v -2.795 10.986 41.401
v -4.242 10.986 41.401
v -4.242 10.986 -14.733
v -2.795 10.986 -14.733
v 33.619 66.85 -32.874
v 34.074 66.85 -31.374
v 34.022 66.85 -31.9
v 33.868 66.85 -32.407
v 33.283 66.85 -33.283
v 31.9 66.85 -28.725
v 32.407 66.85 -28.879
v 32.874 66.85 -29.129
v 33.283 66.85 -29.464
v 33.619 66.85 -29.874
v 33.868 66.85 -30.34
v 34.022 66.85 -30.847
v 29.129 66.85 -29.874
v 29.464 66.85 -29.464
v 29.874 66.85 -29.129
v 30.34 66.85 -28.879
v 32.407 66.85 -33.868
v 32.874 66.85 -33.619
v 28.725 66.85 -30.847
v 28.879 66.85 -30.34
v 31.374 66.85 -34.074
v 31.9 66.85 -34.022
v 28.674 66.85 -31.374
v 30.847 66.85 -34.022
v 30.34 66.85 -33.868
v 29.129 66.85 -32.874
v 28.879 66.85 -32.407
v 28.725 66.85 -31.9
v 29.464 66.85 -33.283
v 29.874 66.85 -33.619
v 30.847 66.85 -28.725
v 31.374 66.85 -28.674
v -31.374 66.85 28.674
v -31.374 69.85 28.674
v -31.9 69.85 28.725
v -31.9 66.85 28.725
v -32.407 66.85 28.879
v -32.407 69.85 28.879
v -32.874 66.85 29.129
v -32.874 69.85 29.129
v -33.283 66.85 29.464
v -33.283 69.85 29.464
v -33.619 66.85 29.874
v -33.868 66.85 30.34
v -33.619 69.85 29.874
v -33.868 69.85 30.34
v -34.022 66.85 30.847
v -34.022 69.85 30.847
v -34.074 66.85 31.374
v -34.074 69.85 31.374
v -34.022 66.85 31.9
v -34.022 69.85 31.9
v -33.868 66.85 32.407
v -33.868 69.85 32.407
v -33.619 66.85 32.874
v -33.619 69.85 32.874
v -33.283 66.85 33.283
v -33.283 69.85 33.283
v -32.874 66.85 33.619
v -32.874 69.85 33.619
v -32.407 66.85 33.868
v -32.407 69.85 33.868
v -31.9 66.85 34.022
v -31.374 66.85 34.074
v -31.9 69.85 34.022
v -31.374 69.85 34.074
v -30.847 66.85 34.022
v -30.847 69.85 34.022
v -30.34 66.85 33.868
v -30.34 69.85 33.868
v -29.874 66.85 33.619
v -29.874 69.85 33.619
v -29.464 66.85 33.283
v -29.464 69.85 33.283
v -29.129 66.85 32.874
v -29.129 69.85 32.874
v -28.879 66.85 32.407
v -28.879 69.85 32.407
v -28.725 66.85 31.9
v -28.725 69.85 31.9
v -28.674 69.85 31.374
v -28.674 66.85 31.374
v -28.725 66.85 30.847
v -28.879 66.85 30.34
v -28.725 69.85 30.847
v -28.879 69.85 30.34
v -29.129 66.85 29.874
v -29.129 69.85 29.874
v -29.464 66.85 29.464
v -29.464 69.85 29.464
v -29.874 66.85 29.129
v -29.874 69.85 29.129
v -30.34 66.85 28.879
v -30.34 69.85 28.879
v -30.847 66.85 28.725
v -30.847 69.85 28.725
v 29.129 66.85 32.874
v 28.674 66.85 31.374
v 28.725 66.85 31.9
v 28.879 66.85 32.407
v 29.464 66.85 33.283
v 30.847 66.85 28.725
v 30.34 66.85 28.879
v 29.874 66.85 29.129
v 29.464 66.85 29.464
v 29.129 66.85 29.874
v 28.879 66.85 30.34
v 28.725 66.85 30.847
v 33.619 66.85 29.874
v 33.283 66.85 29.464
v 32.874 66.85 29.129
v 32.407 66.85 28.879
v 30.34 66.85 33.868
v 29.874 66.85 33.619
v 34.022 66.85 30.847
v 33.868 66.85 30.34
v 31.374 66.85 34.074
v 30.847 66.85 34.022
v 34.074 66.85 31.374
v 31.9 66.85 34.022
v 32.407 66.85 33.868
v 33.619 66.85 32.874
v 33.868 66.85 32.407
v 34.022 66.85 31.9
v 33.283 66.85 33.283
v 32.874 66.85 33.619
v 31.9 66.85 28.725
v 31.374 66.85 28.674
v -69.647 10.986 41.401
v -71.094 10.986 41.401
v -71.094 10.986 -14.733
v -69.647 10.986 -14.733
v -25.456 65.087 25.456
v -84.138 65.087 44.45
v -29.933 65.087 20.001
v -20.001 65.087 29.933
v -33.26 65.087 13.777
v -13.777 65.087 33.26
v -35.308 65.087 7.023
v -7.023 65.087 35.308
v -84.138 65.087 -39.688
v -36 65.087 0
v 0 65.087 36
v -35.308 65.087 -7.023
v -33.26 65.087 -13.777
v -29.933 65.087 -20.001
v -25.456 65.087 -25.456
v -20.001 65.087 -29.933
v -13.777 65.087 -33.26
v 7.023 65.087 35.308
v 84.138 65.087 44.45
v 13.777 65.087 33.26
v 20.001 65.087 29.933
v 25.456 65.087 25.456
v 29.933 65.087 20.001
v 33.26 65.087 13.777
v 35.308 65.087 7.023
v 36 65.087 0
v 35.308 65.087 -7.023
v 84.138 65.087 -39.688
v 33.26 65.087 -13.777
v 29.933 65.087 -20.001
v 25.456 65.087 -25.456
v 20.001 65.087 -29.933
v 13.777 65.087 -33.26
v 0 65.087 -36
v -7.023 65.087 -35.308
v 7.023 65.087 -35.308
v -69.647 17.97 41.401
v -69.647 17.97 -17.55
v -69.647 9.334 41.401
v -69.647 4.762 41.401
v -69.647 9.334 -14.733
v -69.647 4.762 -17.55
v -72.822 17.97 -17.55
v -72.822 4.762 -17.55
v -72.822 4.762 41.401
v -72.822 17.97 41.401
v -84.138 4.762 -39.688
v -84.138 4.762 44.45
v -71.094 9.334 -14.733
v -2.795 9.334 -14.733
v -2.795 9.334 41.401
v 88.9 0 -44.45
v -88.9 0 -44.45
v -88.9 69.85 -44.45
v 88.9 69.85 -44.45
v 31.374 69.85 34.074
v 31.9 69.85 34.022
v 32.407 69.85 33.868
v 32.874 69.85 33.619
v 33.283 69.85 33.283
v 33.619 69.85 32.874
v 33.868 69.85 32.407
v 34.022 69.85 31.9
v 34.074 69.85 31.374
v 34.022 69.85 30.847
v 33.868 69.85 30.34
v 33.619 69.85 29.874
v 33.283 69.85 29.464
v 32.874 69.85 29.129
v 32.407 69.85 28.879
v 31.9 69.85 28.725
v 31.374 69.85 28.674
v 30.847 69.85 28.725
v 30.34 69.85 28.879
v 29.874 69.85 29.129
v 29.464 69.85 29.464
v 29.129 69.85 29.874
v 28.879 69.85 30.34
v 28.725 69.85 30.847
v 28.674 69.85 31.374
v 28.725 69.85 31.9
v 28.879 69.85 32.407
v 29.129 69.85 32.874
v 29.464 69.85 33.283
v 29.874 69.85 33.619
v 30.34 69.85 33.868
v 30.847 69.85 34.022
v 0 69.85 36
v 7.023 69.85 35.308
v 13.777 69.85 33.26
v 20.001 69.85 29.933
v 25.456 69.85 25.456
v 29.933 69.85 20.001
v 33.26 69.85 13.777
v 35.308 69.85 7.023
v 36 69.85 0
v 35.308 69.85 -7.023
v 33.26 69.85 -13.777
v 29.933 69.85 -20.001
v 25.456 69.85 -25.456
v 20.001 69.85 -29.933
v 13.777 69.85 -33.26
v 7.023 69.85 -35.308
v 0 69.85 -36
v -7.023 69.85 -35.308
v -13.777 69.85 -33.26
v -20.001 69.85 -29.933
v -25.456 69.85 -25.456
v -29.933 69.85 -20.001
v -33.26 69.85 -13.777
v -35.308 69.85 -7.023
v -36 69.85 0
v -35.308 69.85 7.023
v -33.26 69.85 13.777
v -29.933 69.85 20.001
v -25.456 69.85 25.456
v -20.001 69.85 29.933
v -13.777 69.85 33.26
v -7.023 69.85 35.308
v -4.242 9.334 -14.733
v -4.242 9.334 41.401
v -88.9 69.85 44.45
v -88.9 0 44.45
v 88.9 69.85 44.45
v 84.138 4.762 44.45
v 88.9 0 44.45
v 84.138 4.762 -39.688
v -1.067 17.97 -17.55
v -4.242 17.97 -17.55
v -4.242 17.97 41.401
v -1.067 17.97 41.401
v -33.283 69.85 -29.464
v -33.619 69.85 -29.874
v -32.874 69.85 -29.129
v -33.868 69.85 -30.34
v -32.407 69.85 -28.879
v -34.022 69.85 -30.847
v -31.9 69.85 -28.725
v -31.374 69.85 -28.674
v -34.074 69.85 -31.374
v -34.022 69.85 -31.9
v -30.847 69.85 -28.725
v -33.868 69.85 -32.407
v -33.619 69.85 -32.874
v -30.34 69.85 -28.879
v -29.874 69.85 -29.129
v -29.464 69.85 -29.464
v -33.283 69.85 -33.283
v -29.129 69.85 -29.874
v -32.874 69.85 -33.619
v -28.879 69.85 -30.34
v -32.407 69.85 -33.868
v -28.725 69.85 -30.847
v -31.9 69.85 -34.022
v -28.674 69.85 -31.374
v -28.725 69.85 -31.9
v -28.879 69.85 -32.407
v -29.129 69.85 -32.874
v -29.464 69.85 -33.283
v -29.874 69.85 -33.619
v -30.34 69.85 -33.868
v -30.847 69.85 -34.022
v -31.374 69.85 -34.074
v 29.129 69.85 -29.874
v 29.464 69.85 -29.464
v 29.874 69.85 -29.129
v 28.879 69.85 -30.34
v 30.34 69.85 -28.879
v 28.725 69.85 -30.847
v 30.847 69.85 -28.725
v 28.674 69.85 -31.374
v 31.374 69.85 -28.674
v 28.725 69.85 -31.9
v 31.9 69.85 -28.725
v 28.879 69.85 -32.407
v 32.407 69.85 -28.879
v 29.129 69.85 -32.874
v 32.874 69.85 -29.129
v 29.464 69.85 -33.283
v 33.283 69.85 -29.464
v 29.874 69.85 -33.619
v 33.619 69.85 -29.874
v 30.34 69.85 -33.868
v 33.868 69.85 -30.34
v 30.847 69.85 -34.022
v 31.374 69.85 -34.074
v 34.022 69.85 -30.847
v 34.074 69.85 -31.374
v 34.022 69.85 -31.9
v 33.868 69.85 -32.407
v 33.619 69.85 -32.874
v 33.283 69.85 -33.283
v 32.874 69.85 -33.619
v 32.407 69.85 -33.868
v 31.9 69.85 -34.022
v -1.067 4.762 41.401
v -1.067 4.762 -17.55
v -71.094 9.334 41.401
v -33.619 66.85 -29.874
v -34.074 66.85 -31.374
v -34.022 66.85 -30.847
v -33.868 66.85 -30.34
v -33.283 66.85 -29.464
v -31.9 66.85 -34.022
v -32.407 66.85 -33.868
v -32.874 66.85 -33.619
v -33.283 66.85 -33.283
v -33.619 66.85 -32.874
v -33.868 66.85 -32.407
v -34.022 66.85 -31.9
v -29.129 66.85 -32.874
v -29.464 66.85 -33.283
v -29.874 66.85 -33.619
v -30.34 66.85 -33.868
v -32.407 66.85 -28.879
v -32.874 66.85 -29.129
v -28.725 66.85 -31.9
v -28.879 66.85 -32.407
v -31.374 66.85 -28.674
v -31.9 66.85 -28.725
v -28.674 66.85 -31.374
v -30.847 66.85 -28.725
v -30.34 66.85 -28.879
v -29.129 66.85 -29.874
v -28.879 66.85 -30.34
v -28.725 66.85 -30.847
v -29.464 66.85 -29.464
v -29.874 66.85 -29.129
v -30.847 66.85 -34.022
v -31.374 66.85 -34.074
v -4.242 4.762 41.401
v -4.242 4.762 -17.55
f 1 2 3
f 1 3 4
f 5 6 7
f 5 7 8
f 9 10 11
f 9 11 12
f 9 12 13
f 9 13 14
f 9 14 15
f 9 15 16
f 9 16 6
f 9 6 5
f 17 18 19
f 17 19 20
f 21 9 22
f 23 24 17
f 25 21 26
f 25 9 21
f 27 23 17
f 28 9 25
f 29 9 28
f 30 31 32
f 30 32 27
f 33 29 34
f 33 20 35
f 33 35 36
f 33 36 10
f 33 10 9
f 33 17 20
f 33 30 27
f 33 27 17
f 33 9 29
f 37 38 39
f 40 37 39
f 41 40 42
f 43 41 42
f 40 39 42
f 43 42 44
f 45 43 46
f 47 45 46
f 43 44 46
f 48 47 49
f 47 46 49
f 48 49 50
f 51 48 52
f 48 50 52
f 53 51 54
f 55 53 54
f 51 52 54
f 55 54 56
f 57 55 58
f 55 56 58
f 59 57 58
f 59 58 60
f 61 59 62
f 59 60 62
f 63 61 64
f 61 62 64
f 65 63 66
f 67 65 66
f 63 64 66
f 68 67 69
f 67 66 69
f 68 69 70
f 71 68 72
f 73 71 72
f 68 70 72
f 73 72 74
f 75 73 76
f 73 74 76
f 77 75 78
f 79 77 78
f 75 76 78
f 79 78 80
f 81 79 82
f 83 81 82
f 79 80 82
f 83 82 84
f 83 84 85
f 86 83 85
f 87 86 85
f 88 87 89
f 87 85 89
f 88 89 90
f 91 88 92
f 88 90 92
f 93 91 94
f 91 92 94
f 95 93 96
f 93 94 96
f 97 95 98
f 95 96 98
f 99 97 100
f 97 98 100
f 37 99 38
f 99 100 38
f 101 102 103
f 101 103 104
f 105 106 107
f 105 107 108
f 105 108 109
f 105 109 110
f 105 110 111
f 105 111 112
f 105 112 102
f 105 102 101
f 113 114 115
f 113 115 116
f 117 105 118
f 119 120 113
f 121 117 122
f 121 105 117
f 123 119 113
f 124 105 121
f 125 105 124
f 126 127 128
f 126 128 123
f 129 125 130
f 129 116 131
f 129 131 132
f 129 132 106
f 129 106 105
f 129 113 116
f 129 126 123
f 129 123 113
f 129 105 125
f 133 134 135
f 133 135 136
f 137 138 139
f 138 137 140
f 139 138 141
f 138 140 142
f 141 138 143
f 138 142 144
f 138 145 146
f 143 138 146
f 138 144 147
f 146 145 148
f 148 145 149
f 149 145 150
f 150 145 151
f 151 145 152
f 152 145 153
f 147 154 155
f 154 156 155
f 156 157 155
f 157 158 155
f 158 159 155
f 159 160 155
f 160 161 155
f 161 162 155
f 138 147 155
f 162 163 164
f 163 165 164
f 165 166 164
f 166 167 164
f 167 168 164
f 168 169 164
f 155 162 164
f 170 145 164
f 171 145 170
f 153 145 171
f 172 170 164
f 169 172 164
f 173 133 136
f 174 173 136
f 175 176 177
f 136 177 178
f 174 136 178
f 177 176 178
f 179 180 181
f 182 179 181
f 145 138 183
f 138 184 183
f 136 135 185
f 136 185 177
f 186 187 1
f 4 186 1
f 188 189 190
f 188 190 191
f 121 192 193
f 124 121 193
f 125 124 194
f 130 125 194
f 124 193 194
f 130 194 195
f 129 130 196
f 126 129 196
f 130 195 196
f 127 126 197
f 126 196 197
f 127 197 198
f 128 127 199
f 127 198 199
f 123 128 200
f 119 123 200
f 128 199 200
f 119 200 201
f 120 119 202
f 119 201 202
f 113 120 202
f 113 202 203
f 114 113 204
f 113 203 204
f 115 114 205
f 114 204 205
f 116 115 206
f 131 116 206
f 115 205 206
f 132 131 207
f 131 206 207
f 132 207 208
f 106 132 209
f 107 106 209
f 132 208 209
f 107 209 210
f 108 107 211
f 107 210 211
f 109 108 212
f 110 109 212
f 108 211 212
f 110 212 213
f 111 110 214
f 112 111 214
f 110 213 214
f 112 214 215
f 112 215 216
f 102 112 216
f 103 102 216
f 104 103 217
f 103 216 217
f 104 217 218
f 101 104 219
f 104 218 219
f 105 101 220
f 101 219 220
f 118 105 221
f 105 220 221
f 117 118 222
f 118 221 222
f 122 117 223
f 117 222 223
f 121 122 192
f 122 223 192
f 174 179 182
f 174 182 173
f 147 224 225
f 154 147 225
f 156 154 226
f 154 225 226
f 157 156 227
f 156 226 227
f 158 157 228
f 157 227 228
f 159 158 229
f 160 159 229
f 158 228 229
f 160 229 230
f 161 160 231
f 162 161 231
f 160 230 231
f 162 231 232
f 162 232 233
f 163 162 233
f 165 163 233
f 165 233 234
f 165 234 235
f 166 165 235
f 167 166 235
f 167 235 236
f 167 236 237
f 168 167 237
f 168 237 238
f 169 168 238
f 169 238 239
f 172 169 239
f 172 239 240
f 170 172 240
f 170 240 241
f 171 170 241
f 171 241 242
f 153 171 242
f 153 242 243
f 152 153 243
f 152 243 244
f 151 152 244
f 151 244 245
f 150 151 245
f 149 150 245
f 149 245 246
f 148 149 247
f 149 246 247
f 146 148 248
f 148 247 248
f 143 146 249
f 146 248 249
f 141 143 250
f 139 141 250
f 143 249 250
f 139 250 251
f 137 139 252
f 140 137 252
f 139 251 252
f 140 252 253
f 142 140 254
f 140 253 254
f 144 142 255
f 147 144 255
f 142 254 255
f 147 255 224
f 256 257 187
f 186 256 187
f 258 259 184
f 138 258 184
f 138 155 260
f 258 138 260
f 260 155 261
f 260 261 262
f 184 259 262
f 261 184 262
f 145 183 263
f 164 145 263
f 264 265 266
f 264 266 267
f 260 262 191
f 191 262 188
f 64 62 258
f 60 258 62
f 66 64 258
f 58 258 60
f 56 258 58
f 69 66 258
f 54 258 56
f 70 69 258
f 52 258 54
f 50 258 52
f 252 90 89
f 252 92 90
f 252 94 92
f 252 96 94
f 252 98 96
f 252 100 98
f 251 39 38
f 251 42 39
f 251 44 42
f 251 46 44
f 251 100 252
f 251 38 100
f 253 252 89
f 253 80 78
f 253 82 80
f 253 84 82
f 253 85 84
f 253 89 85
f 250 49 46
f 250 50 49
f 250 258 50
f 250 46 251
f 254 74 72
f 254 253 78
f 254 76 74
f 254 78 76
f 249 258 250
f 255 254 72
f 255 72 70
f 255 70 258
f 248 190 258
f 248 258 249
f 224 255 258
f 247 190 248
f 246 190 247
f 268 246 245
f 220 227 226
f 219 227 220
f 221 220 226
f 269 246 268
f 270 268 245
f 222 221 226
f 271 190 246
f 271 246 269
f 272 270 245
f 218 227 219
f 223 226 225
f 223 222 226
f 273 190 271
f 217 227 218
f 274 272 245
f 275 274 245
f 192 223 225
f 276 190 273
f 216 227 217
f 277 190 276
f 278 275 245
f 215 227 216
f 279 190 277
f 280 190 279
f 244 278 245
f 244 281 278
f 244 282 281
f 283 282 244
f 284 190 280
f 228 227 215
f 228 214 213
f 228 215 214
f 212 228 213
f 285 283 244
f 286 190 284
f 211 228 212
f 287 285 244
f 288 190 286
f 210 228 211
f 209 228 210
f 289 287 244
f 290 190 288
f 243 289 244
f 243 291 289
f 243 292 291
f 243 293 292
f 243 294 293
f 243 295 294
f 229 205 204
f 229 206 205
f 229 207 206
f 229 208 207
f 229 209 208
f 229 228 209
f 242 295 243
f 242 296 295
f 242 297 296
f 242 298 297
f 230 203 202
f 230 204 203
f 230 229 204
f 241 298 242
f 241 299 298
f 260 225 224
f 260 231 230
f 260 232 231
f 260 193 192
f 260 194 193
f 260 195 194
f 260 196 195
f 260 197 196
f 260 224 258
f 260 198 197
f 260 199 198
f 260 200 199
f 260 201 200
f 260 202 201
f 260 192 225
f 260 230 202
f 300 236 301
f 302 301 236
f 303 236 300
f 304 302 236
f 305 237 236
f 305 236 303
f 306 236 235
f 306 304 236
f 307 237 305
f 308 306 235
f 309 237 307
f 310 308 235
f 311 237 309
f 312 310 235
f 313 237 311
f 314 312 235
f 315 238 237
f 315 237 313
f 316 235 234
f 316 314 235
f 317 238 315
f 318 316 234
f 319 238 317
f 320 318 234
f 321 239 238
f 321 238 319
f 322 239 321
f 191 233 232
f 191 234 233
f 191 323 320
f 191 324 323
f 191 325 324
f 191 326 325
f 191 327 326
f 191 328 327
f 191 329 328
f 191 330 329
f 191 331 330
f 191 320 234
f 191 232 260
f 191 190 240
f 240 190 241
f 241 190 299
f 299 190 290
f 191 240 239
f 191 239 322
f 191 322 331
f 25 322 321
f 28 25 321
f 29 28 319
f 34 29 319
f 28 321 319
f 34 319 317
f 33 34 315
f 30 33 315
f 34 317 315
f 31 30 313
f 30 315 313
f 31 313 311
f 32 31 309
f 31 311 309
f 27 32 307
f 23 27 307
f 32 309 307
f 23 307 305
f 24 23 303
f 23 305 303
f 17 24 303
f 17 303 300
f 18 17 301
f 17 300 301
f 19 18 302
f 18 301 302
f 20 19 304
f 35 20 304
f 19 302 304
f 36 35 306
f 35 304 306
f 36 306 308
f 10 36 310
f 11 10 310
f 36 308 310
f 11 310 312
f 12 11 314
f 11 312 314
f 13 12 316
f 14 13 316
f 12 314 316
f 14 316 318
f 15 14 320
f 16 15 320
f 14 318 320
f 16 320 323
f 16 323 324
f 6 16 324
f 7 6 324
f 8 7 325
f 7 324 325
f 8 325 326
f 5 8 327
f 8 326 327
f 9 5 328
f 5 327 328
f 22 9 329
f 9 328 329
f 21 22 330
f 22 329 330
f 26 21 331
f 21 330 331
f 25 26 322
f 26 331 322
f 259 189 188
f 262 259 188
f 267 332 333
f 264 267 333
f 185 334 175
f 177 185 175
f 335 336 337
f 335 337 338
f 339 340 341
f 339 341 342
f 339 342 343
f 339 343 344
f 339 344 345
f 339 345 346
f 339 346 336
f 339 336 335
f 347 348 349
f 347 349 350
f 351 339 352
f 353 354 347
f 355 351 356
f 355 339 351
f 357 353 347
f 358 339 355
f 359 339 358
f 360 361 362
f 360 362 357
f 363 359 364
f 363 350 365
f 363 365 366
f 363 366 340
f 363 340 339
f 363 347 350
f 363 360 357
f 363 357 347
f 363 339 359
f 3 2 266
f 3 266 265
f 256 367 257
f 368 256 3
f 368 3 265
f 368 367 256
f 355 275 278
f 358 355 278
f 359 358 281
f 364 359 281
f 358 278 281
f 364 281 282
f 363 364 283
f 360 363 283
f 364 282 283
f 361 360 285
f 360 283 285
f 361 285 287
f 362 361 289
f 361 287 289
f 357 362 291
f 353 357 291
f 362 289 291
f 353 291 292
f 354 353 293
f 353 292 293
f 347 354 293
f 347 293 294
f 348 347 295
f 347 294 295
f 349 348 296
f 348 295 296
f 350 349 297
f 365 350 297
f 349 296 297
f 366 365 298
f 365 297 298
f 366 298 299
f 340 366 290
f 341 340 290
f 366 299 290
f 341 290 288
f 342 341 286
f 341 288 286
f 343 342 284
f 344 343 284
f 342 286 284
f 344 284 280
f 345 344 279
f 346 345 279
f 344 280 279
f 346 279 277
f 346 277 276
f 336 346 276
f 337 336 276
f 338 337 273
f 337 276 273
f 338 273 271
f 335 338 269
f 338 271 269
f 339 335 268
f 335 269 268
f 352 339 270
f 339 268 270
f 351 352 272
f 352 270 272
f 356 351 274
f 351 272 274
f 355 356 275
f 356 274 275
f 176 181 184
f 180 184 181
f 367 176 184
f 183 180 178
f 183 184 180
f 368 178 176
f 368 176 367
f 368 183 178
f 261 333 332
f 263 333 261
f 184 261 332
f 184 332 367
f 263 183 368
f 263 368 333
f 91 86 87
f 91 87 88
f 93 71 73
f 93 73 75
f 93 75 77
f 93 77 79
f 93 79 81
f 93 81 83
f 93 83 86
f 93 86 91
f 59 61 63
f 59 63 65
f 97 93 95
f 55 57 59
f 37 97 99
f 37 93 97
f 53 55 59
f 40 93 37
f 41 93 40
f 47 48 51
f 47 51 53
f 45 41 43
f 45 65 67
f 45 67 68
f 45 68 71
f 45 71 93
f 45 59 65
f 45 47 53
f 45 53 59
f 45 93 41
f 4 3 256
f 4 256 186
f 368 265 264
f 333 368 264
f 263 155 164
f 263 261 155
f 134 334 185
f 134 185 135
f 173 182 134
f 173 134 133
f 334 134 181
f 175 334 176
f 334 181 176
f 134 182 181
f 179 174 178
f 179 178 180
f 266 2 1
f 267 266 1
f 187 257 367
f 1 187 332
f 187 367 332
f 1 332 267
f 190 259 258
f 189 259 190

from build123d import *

# Parameters (mm, degrees)
SKETCH1_W           = 177.8
SKETCH1_H           = 88.9
BOSS_EXTRUDE1_DEPTH = 69.85
SHELL1_T            = -4.7625
SKETCH3_R           = 36
CUT_EXTRUDE1_DEPTH  = 57.912
SKETCH4_R           = 2.7
CUT_EXTRUDE4_DEPTH  = 3
SKETCH5_W           = 3.175
SKETCH5_H           = 58.95074776
BOSS_EXTRUDE4_DEPTH = 13.208
SKETCH8_W           = 1.447073232
SKETCH8_H           = 1.651
CUT_EXTRUDE8_DEPTH  = 56.134


with BuildPart() as part:
    # Sketch1 → Boss-Extrude1 (new body)
    with BuildSketch(Plane(origin=(0, 0, 0), x_dir=(1, 0, 0), z_dir=(0, 1, 0))):
        Rectangle(SKETCH1_W, SKETCH1_H)
    extrude(amount=BOSS_EXTRUDE1_DEPTH)

    # Shell1
    shell1_openings = [part.faces().sort_by_distance(p)[0] for p in [
        (0, 34.925, 44.45),
    ]]
    offset(amount=SHELL1_T, openings=shell1_openings, kind=Kind.INTERSECTION)

    # Sketch3 → Cut-Extrude1 (cut)
    with BuildSketch(Plane(origin=(0, 69.85, 0), x_dir=(1, 0, 0), z_dir=(0, 1, 0))):
        with Locations(Location((0, 0, 0), (0, 0, 270))):
            Circle(SKETCH3_R)
    extrude(amount=-CUT_EXTRUDE1_DEPTH, mode=Mode.SUBTRACT)

    # Sketch4 → Cut-Extrude4 (cut)
    with BuildSketch(Plane(origin=(0, 69.85, 0), x_dir=(1, 0, 0), z_dir=(0, 1, 0))):
        with Locations(Location((-31.373598792, 31.373598792, 0), (0, 0, 270))):
            Circle(SKETCH4_R)
        with Locations(Location((31.373598792, 31.373598792, 0), (0, 0, 90))):
            Circle(SKETCH4_R)
        with Locations(Location((31.373598792, -31.373598792, 0), (0, 0, 270))):
            Circle(SKETCH4_R)
        with Locations(Location((-31.373598792, -31.373598792, 0), (0, 0, 90))):
            Circle(SKETCH4_R)
    extrude(amount=-CUT_EXTRUDE4_DEPTH, mode=Mode.SUBTRACT)

    # Sketch5 → Boss-Extrude4 (add)
    with BuildSketch(Plane(origin=(0, 4.7625, 0), x_dir=(1, 0, 0), z_dir=(0, 1, 0))):
        with Locations((-2.654293776, -11.925687975)):
            Rectangle(SKETCH5_W, SKETCH5_H)
        Polygon((-69.646793776, -41.401061855), (-69.646793776, 17.549685905), (-72.821793776, 17.549685905), (-72.821793776, 0), (-72.821793776, -41.401061855), align=None)
    extrude(amount=BOSS_EXTRUDE4_DEPTH)

    # Sketch8 → Cut-Extrude8 (cut)
    with BuildSketch(Plane.XY.offset(41.401061855)):
        with Locations((-70.370330392, 10.16)):
            Rectangle(SKETCH8_W, SKETCH8_H)
        with Locations((-3.51825716, 10.16)):
            Rectangle(SKETCH8_W, SKETCH8_H)
    extrude(amount=-CUT_EXTRUDE8_DEPTH, mode=Mode.SUBTRACT)


solid = part.part
